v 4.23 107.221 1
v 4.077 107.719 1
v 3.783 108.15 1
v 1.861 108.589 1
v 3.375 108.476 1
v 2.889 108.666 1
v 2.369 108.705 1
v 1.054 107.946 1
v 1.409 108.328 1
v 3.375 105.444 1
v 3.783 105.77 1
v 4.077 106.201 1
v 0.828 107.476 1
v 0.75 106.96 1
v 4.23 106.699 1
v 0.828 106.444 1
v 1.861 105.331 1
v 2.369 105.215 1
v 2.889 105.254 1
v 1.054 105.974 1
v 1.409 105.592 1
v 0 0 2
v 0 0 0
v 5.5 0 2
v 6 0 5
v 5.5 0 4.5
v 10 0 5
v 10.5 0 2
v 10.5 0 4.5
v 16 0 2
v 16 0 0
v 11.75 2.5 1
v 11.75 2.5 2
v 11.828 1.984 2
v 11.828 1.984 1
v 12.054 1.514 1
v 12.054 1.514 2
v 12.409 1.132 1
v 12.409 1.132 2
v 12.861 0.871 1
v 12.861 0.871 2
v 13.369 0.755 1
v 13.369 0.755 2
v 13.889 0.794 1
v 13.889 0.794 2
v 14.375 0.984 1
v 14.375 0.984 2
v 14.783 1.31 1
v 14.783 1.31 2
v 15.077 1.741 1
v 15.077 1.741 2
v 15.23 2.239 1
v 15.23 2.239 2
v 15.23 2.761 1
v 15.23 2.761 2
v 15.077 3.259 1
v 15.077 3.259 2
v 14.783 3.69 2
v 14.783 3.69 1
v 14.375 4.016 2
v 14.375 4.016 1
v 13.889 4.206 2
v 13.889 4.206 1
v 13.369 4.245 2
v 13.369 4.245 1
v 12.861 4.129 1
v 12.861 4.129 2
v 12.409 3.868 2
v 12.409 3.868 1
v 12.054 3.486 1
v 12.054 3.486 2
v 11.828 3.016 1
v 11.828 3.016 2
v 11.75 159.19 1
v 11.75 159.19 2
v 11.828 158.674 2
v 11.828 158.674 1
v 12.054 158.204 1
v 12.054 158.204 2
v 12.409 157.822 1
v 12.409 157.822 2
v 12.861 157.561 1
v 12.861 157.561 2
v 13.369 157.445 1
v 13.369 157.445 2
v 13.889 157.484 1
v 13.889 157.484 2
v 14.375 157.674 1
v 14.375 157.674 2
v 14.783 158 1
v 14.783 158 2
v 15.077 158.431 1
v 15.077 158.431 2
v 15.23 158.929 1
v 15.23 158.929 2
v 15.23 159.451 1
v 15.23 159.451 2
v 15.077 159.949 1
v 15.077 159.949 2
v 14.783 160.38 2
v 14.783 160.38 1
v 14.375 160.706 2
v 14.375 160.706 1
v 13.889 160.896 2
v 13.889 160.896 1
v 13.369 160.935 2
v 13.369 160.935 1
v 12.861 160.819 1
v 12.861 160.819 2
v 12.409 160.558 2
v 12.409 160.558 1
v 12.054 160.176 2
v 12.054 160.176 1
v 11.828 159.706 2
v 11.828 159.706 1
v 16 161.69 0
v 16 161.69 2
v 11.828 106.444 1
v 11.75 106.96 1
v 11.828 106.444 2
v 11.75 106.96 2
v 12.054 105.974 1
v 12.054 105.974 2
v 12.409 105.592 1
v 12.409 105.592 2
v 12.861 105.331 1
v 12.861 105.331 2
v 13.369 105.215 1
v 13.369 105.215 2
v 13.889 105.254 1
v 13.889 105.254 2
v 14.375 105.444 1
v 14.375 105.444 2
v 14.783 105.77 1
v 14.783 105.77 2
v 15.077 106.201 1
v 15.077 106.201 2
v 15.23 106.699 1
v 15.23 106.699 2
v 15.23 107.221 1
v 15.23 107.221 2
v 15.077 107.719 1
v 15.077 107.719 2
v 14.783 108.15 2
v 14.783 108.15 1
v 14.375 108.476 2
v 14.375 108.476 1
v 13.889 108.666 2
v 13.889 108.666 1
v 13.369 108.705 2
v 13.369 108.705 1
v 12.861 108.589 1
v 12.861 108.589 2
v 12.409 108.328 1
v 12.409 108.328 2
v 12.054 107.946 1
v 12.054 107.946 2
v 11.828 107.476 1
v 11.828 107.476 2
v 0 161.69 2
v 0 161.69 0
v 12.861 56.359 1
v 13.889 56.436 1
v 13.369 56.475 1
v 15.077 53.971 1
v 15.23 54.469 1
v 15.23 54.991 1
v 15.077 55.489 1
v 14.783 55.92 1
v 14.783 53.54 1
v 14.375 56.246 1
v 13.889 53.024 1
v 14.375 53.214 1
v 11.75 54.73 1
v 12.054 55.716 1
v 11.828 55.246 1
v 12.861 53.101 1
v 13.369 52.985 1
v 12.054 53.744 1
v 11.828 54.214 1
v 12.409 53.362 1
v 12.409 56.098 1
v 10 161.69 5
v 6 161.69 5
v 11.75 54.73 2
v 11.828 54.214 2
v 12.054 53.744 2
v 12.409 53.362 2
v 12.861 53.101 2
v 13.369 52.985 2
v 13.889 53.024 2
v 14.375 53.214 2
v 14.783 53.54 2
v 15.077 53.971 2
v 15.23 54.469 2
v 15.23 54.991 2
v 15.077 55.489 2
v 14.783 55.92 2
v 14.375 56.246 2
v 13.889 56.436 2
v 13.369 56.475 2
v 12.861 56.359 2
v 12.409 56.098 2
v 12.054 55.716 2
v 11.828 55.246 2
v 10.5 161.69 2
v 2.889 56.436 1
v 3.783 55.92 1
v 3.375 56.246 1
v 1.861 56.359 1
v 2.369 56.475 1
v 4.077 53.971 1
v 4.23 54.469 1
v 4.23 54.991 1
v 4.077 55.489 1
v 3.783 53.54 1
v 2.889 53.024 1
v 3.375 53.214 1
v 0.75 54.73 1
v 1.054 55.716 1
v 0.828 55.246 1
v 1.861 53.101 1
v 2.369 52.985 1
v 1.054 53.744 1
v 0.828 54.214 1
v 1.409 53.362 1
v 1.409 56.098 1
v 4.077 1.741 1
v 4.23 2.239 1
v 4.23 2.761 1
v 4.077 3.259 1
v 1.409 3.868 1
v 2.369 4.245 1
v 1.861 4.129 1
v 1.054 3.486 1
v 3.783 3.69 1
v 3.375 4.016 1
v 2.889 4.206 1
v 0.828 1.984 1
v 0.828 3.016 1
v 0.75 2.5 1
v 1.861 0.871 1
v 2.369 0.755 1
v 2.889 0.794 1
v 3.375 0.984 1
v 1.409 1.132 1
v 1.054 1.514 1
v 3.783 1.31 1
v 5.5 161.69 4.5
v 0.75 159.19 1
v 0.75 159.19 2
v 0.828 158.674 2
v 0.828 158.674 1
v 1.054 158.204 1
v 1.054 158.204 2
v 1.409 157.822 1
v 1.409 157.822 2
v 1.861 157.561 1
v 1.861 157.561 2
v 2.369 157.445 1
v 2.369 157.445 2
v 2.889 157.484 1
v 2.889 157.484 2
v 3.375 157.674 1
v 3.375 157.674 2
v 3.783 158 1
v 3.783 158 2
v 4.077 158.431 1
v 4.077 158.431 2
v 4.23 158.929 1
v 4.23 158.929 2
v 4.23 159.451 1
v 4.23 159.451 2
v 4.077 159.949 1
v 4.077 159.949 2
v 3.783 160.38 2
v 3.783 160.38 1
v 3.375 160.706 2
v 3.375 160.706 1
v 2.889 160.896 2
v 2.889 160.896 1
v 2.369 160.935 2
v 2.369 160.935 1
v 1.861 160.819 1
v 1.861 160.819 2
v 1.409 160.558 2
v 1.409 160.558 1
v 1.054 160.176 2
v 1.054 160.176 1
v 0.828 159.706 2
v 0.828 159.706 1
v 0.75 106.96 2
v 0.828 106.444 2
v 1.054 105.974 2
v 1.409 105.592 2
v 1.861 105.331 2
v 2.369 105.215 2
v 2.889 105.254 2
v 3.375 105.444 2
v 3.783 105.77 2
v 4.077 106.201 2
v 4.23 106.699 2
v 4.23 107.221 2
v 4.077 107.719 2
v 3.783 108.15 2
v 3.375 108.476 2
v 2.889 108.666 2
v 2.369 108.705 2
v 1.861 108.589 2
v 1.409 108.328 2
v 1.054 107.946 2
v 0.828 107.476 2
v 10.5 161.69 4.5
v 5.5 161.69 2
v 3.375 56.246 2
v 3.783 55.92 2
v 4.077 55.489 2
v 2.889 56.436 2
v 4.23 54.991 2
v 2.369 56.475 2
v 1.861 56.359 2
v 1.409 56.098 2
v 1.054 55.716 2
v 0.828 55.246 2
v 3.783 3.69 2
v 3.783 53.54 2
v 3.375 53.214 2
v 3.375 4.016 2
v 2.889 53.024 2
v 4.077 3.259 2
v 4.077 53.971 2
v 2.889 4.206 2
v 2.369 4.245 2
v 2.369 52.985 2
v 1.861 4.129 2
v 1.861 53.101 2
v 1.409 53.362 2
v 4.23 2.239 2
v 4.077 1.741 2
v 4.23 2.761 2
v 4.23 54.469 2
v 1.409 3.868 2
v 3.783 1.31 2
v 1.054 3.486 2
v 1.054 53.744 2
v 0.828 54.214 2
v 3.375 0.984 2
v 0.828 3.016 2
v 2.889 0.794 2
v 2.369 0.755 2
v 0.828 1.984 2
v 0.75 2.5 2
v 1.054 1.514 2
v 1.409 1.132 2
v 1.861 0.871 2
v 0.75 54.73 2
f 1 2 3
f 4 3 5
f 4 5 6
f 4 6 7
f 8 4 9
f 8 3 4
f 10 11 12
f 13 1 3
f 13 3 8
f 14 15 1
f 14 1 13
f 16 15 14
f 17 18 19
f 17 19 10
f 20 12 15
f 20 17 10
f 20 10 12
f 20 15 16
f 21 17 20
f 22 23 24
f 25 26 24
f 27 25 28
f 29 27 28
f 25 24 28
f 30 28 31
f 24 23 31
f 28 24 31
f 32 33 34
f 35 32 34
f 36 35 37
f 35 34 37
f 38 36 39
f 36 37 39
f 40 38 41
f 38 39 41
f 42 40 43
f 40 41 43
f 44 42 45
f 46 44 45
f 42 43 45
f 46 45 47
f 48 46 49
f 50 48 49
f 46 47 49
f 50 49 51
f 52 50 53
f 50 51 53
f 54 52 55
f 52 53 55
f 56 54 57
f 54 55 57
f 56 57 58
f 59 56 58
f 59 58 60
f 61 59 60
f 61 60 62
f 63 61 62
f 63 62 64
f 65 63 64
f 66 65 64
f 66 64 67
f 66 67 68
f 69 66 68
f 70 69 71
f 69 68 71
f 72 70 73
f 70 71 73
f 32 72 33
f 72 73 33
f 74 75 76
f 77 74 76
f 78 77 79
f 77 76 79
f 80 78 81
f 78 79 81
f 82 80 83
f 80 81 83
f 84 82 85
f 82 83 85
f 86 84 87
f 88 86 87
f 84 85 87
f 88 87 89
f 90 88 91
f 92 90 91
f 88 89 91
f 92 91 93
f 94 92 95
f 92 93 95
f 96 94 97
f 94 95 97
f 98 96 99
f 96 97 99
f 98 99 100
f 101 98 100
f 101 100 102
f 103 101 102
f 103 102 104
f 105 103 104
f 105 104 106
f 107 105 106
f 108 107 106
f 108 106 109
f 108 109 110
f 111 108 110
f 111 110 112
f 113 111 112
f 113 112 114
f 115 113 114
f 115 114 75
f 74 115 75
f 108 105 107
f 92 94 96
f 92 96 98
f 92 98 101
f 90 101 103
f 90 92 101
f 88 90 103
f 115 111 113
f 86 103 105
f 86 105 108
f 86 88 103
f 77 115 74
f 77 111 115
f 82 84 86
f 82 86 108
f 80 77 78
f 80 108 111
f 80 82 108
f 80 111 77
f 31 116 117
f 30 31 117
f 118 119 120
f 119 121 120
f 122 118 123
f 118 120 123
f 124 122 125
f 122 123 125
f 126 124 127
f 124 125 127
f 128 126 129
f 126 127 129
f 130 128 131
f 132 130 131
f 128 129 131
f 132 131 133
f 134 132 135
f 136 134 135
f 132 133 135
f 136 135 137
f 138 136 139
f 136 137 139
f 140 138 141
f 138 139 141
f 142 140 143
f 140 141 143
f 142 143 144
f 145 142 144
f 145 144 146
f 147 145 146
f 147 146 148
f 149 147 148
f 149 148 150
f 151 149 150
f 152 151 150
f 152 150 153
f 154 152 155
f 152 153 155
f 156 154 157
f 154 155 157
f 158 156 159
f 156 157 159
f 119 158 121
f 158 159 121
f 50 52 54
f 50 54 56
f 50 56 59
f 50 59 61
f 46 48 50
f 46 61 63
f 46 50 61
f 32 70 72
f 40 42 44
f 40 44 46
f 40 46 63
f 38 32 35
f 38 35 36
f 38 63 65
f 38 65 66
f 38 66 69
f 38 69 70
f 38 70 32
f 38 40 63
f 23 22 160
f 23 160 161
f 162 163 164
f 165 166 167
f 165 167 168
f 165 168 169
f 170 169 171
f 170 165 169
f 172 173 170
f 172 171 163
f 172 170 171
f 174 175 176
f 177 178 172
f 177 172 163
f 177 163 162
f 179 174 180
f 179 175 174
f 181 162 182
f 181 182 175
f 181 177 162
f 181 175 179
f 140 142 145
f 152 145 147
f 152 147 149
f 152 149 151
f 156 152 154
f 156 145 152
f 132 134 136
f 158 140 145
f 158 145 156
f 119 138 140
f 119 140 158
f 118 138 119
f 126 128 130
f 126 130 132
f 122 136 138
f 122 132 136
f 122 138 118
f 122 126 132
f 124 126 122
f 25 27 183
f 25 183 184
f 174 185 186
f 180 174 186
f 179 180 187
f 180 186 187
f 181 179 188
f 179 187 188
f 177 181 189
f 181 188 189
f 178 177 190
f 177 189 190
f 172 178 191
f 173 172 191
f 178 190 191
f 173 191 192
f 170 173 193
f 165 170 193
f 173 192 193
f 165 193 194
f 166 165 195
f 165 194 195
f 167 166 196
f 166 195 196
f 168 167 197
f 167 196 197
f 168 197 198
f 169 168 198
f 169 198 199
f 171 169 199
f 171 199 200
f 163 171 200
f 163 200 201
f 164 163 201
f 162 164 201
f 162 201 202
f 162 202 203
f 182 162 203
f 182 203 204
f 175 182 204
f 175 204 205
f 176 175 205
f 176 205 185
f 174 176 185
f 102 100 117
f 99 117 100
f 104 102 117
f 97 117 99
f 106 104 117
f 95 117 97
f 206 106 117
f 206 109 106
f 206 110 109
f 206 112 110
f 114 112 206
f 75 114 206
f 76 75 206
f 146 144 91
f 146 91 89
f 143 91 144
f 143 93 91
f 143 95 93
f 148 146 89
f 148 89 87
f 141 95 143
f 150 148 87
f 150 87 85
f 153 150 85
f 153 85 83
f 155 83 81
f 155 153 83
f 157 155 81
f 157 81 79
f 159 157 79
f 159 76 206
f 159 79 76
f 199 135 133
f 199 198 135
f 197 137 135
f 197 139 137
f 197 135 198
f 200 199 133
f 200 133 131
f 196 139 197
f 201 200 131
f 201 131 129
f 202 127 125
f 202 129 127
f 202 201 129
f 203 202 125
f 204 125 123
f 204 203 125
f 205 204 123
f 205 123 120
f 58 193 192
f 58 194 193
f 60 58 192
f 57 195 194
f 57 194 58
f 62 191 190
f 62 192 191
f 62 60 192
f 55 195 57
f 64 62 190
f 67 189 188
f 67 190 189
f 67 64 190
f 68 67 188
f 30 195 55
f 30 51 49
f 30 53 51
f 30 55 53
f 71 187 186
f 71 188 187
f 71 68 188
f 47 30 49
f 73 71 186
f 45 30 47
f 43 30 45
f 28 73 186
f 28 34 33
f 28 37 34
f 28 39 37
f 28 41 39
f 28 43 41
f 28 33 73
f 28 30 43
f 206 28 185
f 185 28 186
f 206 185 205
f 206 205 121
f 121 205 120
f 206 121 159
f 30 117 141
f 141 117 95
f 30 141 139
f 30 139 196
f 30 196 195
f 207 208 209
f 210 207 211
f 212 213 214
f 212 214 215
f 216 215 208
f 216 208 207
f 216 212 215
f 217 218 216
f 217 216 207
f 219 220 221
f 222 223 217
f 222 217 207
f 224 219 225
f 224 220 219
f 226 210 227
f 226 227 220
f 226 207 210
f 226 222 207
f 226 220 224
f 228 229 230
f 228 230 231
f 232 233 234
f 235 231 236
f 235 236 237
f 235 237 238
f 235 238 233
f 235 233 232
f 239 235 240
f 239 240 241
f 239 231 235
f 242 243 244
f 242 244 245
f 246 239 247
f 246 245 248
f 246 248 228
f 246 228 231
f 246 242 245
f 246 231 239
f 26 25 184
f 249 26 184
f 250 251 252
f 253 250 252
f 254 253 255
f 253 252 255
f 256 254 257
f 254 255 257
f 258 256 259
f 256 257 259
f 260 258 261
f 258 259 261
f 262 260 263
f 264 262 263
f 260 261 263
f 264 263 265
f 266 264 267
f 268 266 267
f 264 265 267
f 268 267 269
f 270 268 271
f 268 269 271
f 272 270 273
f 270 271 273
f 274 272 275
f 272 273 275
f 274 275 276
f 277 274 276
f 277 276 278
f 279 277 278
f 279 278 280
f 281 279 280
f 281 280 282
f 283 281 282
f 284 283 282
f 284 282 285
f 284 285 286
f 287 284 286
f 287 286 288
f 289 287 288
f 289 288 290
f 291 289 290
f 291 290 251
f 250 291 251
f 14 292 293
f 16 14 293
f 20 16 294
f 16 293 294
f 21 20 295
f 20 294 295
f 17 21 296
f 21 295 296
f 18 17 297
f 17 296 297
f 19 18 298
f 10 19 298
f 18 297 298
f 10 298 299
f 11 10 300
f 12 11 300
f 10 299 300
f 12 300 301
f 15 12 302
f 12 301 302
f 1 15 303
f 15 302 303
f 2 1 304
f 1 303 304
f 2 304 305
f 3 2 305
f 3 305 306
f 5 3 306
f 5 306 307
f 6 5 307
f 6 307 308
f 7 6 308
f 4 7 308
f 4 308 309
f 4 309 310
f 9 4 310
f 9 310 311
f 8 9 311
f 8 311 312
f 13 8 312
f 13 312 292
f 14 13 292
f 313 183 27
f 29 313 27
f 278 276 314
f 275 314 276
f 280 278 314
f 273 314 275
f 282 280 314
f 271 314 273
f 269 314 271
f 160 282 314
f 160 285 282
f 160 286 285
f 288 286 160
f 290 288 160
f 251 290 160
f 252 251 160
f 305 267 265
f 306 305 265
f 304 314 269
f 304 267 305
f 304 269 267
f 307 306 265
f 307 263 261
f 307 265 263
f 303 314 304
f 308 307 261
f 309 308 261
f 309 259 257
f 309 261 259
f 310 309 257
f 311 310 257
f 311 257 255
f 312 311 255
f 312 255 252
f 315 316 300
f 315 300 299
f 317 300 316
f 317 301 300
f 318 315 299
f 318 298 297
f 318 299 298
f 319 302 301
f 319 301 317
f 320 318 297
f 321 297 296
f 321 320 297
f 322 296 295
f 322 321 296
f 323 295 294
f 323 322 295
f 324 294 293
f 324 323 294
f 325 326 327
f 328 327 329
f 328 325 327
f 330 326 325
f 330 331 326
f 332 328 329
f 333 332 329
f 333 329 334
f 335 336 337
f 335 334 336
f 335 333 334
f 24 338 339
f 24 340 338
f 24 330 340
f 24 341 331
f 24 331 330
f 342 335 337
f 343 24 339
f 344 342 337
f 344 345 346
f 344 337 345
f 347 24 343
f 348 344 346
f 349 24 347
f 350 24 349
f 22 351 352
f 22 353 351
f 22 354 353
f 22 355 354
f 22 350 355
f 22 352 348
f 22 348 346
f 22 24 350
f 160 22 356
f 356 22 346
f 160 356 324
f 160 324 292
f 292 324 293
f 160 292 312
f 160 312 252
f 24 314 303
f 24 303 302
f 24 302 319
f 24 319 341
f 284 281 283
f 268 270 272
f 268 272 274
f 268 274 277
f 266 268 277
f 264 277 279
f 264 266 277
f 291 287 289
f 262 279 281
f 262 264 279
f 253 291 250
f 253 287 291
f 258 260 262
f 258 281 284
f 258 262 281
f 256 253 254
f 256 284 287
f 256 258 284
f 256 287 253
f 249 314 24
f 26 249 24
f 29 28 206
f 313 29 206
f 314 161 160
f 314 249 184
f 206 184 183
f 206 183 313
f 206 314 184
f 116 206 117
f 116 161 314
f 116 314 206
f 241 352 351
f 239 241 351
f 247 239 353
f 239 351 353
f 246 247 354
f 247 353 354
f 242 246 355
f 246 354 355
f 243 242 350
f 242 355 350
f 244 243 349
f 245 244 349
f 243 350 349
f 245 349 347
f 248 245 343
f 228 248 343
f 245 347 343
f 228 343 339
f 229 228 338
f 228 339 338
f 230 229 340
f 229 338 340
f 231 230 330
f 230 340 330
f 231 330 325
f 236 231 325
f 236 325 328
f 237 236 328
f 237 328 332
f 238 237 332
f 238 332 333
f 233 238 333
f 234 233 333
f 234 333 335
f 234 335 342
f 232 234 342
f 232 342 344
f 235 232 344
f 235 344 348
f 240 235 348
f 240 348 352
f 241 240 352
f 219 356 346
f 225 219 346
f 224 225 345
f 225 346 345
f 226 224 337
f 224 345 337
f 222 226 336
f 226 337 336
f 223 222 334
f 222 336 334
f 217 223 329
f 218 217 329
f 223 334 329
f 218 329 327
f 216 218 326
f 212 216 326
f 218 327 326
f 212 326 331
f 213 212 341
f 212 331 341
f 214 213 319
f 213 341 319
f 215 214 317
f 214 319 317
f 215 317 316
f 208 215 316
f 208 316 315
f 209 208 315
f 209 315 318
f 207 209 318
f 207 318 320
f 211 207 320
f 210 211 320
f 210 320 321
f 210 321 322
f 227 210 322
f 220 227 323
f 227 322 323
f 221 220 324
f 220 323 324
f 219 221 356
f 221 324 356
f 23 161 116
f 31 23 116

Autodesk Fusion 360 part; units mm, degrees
sketch "3D-printed conduit top outline" plane through (0, 0, 0) normal (0, 1, 0) x (1, 0, 0)
  line L0 (0, 0) -> (16, 0)
  line L1 (16, 0) -> (16, -2)
  line L2 (16, -2) -> (0, -2)
  line L3 (0, -2) -> (0, 0)
  dimension "d7" = 16
  dimension "d8" = 2
extrude "Extrude1" add sketch "3D-printed conduit top outline" along normal blind 161.69
sketch "Magnet holes" plane through (0, 0, 2) normal (0, 0, 1) x (-1, 0, 0)
  line L0 (0, 0) -> (-16, 0)
  line L1 (-16, 0) -> (-16, -161.69)
  line L2 (-16, -161.69) -> (0, -161.69)
  line L3 (0, -161.69) -> (0, 0)
  circle A0 centre (-2.5, -2.5) radius 2.5
  circle A1 centre (-13.5, -2.5) radius 2.5
  circle A2 centre (-2.5, -2.5) radius 1.75
  circle A3 centre (-13.5, -2.5) radius 1.75
  circle A4 centre (-2.5, -54.73) radius 1.75
  circle A5 centre (-2.5, -54.73) radius 2.5
  circle A6 centre (-13.5, -54.73) radius 2.5
  circle A7 centre (-13.5, -54.73) radius 1.75
  circle A8 centre (-2.5, -106.96) radius 1.75
  circle A9 centre (-2.5, -106.96) radius 2.5
  circle A10 centre (-13.5, -106.96) radius 2.5
  circle A11 centre (-13.5, -106.96) radius 1.75
  circle A12 centre (-2.5, -159.19) radius 1.75
  circle A13 centre (-2.5, -159.19) radius 2.5
  circle A14 centre (-13.5, -159.19) radius 2.5
  circle A15 centre (-13.5, -159.19) radius 1.75
  dimension "d11" = 5
  dimension "d12" = 5
  dimension "d13" = 3.5
  dimension "d14" = 3.5
  dimension "d17" = 0
  dimension "d18" = -156.69
extrude "Extrude2" cut sketch "Magnet holes" against normal blind 1 contours A2 | A3 | A4 | A7 | A8 | A11 | A12 | A15
sketch "Support rib" plane through (0, 0, 2) normal (0, 0, 1) x (-1, 0, 0)
  line L0 (0, 0) -> (-16, 0)
  line L1 (-16, 0) -> (-16, -161.69)
  line L2 (-16, -161.69) -> (0, -161.69)
  line L3 (0, -161.69) -> (0, 0)
  circle A0 centre (-13.5, -159.19) radius 1.75
  circle A1 centre (-13.5, -54.73) radius 1.75
  circle A2 centre (-2.5, -2.5) radius 1.75
  circle A3 centre (-2.5, -106.96) radius 1.75
  circle A4 centre (-2.5, -159.19) radius 1.75
  circle A5 centre (-2.5, -54.73) radius 1.75
  circle A6 centre (-13.5, -2.5) radius 1.75
  circle A7 centre (-13.5, -106.96) radius 1.75
  line L4 (-5.5, 0) -> (-10.5, 0)
  line L5 (-10.5, 0) -> (-10.5, -161.69)
  line L6 (-10.5, -161.69) -> (-5.5, -161.69)
  line L7 (-5.5, -161.69) -> (-5.5, 0)
  dimension "d23" = 5
  dimension "d24" = 5.5
  dimension "d25" = 5.5
extrude "Extrude3" add sketch "Support rib" along normal blind 3 contours L0 L2 L4 L5 L6 L7
chamfer "Chamfer1" distance 0.5 angle 45 2 edges at (5.5, 80.845, 5) (10.5, 80.845, 5)
equation "conduit_length = 161.69 mm"
equation "conduit_width = 16 mm"
equation "conduit_wall_thickness = 2 mm"
equation "magnet_diameter = 3 mm"
equation "magnet_height = 1 mm"
equation "number_of_magnets_on_a_side = 4"
equation "d7 = conduit_width"
equation "d8 = conduit_wall_thickness"
equation "d9 = conduit_length"
equation "d11 = magnet_diameter + 2 mm"
equation "d12 = magnet_diameter + 2 mm"
equation "d13 = magnet_diameter + 0.5 mm"
equation "d14 = magnet_diameter + 0.5 mm"
equation "d16 = number_of_magnets_on_a_side"
equation "d18 = -conduit_length + magnet_diameter + 2 mm"
equation "d19 = -magnet_height"
equation "rib_width = 5 mm"
equation "rib_height = 3 mm"
equation "d23 = rib_width"
equation "d24 = ( conduit_width - rib_width ) / 2"
equation "d26 = rib_height"
equation "rib_chamfer = 0.5 mm"
equation "d29 = rib_chamfer"
